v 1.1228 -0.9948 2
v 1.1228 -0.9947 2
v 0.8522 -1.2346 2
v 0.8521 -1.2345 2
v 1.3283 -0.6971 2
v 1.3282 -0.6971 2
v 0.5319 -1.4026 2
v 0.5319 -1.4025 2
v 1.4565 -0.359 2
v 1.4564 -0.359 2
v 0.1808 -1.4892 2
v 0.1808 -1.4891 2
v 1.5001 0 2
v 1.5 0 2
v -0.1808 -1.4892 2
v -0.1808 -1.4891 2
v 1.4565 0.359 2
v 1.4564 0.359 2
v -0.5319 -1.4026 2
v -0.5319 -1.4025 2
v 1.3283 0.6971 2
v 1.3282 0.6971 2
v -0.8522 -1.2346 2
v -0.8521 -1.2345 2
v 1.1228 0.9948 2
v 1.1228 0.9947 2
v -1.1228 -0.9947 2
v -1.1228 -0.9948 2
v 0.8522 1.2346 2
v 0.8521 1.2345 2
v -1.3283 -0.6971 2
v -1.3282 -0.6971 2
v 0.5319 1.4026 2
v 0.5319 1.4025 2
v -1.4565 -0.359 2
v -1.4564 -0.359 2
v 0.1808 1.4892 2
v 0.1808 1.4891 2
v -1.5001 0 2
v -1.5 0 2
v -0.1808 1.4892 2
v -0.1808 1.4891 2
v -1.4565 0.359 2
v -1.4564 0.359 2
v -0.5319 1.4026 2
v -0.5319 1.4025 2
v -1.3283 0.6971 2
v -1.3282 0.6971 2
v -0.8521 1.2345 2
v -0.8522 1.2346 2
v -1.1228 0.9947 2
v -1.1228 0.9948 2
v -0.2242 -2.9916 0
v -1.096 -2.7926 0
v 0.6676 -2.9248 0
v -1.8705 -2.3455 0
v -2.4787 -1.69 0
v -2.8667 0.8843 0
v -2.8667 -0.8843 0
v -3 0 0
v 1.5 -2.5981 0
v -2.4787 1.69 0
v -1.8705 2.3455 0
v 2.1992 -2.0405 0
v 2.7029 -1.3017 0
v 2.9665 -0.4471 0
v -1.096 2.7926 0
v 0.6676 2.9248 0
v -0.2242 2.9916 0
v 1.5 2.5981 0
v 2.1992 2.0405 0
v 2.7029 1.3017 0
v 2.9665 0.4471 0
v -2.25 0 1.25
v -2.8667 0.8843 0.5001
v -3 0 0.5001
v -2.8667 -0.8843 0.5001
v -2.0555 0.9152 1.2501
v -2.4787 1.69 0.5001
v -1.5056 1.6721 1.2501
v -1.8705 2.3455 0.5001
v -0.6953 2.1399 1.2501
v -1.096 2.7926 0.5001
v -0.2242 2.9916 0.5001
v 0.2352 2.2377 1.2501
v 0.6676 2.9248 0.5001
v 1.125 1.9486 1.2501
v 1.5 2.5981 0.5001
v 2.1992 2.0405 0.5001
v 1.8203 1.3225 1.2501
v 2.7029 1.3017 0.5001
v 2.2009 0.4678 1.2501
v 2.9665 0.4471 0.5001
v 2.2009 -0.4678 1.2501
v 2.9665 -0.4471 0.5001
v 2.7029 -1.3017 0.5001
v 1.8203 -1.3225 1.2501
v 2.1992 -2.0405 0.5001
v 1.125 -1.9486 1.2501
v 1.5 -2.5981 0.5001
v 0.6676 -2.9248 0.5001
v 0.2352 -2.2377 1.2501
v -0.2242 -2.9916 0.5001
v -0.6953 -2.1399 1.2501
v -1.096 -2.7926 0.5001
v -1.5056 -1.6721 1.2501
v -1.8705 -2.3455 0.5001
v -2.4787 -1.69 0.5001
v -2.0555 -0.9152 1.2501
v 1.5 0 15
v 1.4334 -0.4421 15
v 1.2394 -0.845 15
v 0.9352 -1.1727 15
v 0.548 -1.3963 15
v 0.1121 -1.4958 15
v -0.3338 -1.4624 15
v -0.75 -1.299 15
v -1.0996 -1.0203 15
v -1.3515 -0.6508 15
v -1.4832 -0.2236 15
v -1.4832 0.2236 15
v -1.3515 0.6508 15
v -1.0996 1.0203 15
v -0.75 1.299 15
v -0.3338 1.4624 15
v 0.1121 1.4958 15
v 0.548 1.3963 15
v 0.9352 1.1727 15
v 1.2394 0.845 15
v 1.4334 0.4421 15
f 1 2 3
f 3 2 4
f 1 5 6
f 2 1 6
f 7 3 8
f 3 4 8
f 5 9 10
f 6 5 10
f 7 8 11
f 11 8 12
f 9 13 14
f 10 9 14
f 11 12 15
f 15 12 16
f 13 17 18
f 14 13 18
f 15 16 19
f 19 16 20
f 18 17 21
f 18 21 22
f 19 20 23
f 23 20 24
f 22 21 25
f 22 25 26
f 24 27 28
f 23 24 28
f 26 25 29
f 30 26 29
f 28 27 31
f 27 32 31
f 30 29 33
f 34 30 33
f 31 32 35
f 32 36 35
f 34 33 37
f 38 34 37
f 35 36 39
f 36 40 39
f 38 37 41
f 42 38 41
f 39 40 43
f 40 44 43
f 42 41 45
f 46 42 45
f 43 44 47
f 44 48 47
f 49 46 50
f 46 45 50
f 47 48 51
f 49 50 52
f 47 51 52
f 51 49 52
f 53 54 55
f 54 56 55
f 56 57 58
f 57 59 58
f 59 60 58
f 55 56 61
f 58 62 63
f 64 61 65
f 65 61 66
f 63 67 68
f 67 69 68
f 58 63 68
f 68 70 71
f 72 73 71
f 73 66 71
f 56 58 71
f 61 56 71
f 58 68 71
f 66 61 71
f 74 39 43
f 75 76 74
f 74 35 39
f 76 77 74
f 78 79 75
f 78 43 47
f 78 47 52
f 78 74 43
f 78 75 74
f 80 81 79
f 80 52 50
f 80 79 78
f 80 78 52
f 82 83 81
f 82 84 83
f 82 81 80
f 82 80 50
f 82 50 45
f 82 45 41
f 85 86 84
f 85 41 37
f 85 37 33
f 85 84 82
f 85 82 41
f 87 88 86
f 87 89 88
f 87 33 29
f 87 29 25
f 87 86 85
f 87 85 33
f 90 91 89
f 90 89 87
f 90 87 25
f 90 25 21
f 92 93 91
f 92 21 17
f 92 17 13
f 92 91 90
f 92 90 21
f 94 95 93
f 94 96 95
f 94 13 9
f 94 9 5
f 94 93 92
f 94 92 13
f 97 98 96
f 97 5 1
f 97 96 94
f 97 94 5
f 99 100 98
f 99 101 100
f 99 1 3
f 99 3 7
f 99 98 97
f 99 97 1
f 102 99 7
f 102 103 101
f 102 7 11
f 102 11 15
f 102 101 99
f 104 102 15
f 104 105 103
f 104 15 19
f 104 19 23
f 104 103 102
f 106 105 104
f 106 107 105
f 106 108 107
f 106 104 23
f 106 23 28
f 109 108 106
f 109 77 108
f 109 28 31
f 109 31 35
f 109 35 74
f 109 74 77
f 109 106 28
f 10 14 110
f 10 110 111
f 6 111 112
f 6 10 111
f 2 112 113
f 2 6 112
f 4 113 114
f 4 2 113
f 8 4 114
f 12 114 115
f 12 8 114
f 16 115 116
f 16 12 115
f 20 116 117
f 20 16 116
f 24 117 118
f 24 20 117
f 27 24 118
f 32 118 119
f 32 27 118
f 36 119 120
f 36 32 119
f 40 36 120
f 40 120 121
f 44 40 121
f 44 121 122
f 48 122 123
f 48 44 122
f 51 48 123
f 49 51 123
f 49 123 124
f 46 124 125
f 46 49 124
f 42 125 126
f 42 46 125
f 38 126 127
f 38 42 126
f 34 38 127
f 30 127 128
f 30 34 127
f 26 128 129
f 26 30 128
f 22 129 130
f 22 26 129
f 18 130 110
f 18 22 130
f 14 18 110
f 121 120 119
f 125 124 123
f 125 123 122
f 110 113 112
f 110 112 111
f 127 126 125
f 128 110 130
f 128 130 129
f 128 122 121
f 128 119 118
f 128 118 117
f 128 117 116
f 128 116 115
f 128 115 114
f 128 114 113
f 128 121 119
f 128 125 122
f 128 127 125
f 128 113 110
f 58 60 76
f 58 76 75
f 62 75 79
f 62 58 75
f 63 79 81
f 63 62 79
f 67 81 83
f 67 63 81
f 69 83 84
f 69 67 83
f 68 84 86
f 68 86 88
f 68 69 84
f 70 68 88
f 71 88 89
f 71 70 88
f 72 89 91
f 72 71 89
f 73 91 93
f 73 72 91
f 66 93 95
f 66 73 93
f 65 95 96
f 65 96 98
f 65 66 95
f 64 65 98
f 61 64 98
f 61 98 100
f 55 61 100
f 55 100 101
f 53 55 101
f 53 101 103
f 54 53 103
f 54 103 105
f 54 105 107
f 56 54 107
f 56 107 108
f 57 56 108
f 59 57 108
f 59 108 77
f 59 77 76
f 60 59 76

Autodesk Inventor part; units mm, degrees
ref_plane "YZ Plane" through (0, 0, 0) normal (1, 0, 0) x (0, 1, 0)
ref_plane "XZ Plane" through (0, 0, 0) normal (0, 1, 0) x (-1, 0, 0)
ref_plane "XY Plane" through (0, 0, 0) normal (0, 0, 1) x (1, 0, 0)
sketch "スケッチ1" plane through (0, 0, 0) normal (0, 0, 1) x (1, 0, 0)
  circle A0 centre (0, 0) radius 1.5
  dimension "d0" = 3
extrude "押し出し1" add sketch "スケッチ1" along normal blind 15
sketch "スケッチ2" plane through (0, 0, 0) normal (0, 0, -1) x (-1, 0, 0)
  circle A0 centre (0, 0) radius 3
  dimension "d3" = 6
extrude "押し出し2" add sketch "スケッチ2" against normal blind 2
thread "ねじ1" size "M3x0.5" class "6g" standard "ANSI Metric M Profile" full length
chamfer "面取り1" distance 1.5 angle 45 1 edges at (3, 0, 2)
properties part number "ネジ皿m3,15" material "鋼、高強度、低合金"
